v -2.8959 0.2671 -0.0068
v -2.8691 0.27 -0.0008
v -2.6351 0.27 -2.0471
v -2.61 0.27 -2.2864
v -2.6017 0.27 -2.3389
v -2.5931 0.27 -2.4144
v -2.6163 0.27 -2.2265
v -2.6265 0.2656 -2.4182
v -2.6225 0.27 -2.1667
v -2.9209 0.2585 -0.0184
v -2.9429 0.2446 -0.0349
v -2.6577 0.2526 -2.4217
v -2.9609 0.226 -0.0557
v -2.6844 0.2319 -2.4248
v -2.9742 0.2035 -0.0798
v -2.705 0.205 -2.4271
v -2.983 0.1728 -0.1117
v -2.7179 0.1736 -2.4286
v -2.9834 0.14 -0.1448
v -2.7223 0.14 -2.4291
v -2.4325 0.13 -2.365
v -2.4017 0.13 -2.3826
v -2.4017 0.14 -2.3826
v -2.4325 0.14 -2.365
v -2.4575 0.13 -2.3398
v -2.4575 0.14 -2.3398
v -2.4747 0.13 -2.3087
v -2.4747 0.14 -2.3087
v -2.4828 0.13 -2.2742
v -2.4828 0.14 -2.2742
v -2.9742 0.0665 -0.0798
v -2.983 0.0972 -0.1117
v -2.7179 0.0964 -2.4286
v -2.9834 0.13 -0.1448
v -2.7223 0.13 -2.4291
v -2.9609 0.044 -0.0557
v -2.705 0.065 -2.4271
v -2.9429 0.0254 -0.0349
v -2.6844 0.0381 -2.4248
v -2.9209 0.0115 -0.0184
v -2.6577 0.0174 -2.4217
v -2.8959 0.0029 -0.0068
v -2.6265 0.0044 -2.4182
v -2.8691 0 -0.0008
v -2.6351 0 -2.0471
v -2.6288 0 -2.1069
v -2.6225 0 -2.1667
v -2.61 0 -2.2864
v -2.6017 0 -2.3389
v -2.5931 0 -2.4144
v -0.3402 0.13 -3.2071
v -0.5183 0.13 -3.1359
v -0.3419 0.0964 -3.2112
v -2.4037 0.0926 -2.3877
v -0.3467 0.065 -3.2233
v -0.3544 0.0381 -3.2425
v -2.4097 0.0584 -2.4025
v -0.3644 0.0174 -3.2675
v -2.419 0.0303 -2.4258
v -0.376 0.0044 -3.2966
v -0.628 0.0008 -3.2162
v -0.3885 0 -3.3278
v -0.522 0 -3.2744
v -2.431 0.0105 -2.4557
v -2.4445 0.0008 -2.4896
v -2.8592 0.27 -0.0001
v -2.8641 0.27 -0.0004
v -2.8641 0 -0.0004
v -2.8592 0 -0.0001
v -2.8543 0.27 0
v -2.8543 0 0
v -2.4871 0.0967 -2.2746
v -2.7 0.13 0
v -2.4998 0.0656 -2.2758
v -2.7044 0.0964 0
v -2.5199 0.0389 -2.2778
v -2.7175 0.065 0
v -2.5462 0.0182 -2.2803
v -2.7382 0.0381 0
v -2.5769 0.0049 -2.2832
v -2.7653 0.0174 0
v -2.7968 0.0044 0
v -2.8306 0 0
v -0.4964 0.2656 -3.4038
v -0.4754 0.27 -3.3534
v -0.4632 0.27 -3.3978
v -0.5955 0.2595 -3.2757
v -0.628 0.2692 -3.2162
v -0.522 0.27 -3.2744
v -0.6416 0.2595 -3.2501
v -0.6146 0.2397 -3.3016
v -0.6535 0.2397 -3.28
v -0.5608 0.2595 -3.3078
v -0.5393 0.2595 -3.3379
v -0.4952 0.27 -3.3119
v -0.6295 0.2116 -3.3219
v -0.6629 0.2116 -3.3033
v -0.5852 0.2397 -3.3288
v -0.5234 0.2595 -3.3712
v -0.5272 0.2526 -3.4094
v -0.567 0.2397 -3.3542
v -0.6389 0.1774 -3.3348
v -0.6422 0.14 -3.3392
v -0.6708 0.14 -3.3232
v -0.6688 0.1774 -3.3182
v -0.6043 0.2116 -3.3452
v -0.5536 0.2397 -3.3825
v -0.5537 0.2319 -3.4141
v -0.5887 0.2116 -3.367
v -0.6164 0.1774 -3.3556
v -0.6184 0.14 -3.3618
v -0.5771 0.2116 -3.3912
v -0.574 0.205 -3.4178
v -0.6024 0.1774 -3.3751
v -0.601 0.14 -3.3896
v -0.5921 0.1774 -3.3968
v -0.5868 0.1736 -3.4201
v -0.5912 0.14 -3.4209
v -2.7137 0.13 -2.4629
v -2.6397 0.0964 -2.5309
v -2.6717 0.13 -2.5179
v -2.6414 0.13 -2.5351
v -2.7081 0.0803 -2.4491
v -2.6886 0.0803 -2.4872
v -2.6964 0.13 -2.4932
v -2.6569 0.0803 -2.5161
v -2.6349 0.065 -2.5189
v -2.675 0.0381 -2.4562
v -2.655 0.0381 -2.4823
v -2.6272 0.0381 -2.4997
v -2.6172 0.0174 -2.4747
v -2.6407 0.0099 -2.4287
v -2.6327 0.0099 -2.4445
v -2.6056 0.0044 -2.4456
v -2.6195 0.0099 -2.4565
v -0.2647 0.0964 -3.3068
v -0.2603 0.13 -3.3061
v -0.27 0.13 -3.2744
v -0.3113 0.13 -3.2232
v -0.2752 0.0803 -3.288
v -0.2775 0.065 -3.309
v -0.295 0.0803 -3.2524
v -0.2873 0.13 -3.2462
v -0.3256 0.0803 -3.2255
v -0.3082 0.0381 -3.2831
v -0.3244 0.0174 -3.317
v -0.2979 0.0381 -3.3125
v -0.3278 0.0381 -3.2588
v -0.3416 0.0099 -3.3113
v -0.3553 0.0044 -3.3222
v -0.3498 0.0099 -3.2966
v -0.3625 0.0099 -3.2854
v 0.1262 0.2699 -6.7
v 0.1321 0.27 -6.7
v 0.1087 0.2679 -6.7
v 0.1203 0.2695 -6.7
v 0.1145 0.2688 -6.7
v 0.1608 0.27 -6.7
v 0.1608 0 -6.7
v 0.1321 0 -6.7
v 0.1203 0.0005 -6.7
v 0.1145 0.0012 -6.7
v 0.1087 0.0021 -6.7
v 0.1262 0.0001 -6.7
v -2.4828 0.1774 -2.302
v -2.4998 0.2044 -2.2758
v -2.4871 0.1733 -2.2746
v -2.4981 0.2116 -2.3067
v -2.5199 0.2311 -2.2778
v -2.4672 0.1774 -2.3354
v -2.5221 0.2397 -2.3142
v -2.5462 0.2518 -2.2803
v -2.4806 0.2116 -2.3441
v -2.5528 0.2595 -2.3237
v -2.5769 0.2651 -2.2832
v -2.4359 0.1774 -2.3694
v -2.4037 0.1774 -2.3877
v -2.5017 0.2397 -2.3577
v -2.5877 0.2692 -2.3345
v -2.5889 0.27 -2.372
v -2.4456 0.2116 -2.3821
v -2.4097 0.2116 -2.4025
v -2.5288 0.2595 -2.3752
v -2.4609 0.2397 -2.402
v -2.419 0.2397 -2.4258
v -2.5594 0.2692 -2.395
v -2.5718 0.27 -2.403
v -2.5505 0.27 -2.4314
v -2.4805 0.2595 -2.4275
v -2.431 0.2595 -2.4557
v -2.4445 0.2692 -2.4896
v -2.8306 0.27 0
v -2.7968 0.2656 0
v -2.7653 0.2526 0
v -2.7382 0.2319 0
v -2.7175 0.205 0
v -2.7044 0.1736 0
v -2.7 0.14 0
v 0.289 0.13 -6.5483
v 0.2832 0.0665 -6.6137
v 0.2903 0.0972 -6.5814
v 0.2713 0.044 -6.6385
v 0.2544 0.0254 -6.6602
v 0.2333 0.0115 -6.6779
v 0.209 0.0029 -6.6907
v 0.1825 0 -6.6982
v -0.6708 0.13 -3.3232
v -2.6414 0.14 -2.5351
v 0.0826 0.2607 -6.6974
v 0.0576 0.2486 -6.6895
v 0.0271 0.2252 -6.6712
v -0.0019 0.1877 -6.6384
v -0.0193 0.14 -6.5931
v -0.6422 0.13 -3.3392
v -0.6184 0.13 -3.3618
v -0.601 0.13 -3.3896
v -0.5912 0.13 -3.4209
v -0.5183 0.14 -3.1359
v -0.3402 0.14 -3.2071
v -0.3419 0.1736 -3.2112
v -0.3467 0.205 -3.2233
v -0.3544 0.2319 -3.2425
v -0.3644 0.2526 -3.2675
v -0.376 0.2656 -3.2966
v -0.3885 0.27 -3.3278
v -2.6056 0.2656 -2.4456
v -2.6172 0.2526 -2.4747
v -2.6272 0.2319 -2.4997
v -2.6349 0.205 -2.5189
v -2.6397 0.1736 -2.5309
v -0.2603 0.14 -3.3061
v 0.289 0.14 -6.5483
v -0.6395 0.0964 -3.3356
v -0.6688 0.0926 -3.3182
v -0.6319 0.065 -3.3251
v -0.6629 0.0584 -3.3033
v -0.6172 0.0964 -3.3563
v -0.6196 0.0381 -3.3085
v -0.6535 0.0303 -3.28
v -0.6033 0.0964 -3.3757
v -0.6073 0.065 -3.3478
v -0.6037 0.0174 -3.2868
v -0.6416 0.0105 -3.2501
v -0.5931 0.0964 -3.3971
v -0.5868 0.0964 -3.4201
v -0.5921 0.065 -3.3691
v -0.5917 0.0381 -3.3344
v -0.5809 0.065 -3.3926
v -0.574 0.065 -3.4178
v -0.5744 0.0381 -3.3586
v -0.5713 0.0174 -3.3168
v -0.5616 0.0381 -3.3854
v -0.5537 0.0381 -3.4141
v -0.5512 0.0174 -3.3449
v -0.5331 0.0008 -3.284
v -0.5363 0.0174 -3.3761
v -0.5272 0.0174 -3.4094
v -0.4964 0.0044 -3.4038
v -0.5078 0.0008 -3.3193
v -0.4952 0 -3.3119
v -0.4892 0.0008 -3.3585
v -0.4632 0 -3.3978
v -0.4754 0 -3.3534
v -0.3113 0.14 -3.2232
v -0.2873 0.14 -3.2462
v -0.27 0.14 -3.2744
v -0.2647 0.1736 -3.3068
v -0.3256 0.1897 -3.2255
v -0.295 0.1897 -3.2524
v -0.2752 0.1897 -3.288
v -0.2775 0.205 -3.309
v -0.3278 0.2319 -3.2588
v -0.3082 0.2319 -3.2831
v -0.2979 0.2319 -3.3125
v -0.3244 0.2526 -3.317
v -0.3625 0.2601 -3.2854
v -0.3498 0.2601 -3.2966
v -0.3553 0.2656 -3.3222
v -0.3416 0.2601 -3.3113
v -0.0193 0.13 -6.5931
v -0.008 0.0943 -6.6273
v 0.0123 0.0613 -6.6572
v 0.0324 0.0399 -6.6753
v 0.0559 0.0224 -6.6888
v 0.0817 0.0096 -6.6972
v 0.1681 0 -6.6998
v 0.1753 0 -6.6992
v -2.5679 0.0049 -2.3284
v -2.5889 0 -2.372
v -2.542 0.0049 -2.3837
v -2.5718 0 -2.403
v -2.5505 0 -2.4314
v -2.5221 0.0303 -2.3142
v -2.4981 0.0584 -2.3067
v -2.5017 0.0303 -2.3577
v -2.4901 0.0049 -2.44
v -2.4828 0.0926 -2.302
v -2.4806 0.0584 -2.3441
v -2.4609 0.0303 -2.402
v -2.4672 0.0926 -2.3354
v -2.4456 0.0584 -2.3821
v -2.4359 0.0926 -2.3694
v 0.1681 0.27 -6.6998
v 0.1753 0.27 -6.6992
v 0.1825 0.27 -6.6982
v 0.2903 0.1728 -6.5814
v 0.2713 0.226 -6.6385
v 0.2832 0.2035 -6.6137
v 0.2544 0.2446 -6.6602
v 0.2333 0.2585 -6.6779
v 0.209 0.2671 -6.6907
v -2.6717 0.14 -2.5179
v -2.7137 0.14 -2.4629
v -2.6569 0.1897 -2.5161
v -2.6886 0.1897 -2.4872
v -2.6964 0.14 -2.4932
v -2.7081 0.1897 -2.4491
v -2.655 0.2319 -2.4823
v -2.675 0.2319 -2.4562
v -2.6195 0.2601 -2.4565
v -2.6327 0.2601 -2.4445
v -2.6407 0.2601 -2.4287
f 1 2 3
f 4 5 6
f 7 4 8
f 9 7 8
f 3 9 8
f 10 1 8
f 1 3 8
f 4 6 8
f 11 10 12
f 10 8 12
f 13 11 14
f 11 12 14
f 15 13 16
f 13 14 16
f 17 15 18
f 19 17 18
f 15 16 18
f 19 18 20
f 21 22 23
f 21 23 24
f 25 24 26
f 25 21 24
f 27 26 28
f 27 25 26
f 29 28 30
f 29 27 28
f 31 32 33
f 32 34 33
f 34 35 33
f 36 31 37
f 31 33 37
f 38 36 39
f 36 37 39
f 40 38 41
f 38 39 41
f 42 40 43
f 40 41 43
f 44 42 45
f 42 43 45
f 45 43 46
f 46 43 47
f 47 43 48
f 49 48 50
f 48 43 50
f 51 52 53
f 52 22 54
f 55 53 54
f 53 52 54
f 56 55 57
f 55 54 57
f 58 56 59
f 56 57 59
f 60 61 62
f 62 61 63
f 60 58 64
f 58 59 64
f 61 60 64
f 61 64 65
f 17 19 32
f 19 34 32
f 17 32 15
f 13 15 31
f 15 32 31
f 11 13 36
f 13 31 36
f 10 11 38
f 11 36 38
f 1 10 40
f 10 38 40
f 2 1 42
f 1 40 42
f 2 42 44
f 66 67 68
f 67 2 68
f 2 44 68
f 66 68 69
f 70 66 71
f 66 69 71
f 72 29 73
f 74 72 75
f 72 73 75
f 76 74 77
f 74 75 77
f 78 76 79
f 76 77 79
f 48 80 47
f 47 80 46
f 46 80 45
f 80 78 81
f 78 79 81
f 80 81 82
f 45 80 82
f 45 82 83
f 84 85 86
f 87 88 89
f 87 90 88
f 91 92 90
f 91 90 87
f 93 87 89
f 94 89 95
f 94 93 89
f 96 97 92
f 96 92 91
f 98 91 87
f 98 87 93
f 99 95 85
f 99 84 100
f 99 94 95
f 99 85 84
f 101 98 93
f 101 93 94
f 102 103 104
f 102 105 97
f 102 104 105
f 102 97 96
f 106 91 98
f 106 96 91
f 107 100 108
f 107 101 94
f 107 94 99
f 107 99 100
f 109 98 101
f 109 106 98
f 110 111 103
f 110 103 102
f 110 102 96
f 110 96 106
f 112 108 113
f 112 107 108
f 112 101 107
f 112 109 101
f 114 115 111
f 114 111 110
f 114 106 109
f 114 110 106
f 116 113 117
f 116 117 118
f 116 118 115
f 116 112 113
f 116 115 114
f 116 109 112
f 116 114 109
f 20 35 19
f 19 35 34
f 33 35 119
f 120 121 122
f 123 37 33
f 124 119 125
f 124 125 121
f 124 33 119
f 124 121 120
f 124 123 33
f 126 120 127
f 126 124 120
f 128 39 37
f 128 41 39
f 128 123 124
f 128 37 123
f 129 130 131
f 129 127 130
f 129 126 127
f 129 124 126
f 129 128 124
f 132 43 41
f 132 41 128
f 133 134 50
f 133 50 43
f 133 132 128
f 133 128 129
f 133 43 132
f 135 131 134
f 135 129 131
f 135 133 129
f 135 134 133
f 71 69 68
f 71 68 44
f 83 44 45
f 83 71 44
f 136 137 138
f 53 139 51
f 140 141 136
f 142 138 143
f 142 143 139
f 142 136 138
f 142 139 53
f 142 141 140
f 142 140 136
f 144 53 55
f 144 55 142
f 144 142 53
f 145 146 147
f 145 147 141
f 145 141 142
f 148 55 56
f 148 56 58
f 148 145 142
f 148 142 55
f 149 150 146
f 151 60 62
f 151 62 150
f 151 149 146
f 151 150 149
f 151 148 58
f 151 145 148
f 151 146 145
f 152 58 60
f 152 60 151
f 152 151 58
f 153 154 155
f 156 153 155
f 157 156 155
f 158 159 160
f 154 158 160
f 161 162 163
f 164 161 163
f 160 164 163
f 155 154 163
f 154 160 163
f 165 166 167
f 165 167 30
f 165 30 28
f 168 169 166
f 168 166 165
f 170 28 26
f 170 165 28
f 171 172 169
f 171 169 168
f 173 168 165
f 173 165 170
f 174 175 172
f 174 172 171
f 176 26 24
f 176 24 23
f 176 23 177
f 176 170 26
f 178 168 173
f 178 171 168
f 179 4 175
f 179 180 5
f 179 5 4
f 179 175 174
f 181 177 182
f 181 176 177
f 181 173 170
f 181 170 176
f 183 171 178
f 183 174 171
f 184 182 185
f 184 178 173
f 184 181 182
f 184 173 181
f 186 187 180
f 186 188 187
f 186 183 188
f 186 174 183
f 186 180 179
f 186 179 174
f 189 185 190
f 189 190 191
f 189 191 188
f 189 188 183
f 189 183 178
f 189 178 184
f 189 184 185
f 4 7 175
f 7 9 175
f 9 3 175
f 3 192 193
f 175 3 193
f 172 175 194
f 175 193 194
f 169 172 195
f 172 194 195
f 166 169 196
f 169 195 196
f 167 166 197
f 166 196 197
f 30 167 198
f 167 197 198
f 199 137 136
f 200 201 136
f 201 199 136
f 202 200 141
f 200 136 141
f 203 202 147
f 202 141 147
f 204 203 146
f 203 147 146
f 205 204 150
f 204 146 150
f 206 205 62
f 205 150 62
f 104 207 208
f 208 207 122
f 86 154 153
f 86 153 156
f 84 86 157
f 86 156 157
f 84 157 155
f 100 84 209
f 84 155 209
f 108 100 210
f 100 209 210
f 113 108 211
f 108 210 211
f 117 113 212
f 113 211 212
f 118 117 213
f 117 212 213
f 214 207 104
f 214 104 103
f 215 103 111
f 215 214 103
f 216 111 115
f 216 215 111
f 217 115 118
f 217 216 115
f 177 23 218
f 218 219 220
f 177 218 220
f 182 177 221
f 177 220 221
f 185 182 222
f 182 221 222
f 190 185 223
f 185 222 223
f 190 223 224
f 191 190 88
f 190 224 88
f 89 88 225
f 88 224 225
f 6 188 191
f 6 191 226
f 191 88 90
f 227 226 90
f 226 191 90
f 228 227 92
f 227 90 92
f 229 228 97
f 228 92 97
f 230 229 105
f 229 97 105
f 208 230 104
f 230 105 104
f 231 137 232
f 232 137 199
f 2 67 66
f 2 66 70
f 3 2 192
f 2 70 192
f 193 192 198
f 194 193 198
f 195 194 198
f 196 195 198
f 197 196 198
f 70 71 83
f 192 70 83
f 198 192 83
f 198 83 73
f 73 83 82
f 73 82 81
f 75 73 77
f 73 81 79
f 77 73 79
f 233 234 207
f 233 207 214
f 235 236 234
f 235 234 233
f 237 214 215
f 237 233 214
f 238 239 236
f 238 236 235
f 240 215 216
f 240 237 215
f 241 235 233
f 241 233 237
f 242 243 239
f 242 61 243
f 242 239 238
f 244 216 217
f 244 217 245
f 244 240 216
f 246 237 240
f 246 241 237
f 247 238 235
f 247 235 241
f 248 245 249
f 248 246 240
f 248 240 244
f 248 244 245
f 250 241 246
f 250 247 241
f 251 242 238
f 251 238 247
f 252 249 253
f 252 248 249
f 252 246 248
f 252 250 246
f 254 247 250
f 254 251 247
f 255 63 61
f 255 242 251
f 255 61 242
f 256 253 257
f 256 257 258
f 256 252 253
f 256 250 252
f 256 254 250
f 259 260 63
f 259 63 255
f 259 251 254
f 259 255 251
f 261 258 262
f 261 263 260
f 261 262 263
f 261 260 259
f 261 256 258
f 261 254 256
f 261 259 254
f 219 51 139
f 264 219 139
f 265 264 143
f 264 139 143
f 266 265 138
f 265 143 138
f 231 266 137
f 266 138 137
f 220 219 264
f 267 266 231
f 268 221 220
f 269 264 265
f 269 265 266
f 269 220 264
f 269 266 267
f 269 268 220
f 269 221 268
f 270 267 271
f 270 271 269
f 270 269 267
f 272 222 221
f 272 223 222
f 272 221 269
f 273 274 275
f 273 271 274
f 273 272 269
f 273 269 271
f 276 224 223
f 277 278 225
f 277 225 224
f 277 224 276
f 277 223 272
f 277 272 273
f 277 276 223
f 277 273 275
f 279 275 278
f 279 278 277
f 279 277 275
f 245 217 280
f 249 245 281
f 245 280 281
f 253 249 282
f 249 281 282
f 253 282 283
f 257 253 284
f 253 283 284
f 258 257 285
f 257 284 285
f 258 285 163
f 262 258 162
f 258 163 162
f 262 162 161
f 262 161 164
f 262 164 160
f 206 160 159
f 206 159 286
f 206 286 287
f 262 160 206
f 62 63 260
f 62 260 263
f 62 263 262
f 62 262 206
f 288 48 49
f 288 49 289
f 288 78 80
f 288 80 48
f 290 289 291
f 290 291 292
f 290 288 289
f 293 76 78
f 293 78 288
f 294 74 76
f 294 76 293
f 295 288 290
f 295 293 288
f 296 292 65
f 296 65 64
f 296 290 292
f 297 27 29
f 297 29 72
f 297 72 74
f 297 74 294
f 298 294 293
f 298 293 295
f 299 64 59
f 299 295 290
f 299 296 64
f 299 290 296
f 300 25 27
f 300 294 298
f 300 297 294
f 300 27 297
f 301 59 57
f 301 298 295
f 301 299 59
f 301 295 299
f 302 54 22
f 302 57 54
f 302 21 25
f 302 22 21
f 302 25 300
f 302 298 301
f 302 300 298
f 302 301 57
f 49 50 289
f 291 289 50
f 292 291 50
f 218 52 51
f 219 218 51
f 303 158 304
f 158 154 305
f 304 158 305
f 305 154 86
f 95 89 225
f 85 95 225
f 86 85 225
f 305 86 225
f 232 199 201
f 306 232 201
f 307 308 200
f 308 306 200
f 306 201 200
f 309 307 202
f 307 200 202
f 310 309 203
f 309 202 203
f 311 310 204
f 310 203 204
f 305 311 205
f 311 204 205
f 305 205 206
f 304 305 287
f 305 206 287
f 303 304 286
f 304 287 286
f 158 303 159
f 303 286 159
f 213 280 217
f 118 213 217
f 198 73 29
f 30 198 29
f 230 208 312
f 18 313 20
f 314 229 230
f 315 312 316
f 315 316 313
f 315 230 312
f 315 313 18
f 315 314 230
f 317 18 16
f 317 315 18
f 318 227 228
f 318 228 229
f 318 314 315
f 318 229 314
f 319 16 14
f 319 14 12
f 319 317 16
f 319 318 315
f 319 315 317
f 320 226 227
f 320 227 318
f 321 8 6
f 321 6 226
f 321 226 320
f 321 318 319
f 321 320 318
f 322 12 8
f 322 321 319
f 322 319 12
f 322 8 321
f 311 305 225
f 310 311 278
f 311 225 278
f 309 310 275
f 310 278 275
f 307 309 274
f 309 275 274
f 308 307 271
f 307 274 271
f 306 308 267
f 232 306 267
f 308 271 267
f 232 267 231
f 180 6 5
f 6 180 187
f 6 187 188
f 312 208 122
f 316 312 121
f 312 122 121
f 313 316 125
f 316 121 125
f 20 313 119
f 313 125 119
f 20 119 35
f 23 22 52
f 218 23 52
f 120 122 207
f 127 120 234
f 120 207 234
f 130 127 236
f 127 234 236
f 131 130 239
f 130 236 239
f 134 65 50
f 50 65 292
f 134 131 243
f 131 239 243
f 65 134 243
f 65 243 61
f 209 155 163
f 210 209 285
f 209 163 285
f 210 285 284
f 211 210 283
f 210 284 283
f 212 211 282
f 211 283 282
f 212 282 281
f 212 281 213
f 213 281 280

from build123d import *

# Parameters (mm, degrees)
RESSALTO_EXTRUS_O1_DEPTH = 0.27
FILETE2_R                = 0.13


with BuildPart() as part:
    # Esboço1 → Ressalto-extrusão1 (new body)
    with BuildSketch(Plane(origin=(0, 0, 0), x_dir=(1, 0, 0), z_dir=(0, 1, 0))):
        Polygon((-0.272513318, 3.234203787), (0.314684076, 6.7), (0.021085379, 6.7), (0, 6.7), (-0.603963749, 3.35), (-2.713451347, 2.506232841), (-3, 0), (-2.7, 0), (-2.475283392, 2.353124871), (-0.518320279, 3.135884251), align=None)
    extrude(amount=RESSALTO_EXTRUS_O1_DEPTH)

    # Filete2
    # the kernel refuses this fillet: 0.13 mm, written as the material it adds along each edge
    with BuildSketch(Plane(origin=(-2.475283392, 0, -2.353124871), x_dir=(-0.0950646065596586, 0, 0.9954711048441623), z_dir=(0, 1, 0))) as filete2_piece_1:
        with BuildLine():
            CenterArc((FILETE2_R * 0.609734486381, FILETE2_R), FILETE2_R, 207.255794996, 62.744205004)
            Line((-FILETE2_R * 0.279236340383, FILETE2_R * 0.542036170465), (0, 0))
            Line((0, 0), (FILETE2_R * 0.609734486381, 0))
        make_face()
    extrude(amount=0.27)
    with BuildSketch(Plane(origin=(-0.603963749, 0, -3.35), x_dir=(-0.9284809223662713, 0, 0.37138009747680073), z_dir=(0, 1, 0))) as filete2_piece_2:
        with BuildLine():
            CenterArc((FILETE2_R * 0.554072981115, -FILETE2_R), FILETE2_R, 90, 57.979304495)
            Line((-FILETE2_R * 0.293783650389, -FILETE2_R * 0.469774451376), (0, 0))
            Line((0, 0), (FILETE2_R * 0.554072981115, 0))
        make_face()
    extrude(amount=0.27)
    # the kernel refuses this fillet: 0.13 mm, written as the material it takes off along each edge
    with BuildSketch(Plane(origin=(-2.593109265, 0.13, -2.414354436), x_dir=(-0.3713800974768016, 0, -0.9284809223662711), z_dir=(0, -1, 0))) as filete2_2_piece_1_section:
        Polygon((0, 0), (FILETE2_R, 0), (FILETE2_R, -FILETE2_R * 0.597027041994), (FILETE2_R * 0.474446418292, -FILETE2_R * 0.880284383691), align=None)
    filete2_2_piece_1 = extrude(amount=FILETE2_R, mode=Mode.PRIVATE)
    filete2_2_piece_1 = filete2_2_piece_1 - Plane(origin=(-2.593109265, 0.13, -2.414354436), x_dir=(0.7948289276830398, 0, 0.6068335650886731), z_dir=(0, -1, 0)) * Sphere(FILETE2_R, mode=Mode.PRIVATE)
    add(filete2_2_piece_1, mode=Mode.SUBTRACT)
    with BuildSketch(Plane(origin=(-0.388504479, 0.13, -3.327822502), x_dir=(0.9859491340163403, 0, 0.16704581746463637), z_dir=(0, -1, 0))) as filete2_2_piece_2_section:
        Polygon((0, 0), (FILETE2_R, 0), (FILETE2_R, FILETE2_R * 0.560980407137), (FILETE2_R * 0.521260740175, FILETE2_R * 0.853397469385), align=None)
    filete2_2_piece_2 = extrude(amount=FILETE2_R, mode=Mode.PRIVATE)
    filete2_2_piece_2 = filete2_2_piece_2 - Plane(origin=(-0.388504479, 0.13, -3.327822502), x_dir=(-0.7781590553418893, 0, -0.6280672611985266), z_dir=(0, -1, 0)) * Sphere(FILETE2_R, mode=Mode.PRIVATE)
    add(filete2_2_piece_2, mode=Mode.SUBTRACT)
    with BuildSketch(Plane(origin=(-0.388504479, 0.14, -3.327822502), x_dir=(0.9859491340163403, 0, 0.16704581746463637), z_dir=(0, 1, 0))) as filete2_2_piece_3_section:
        Polygon((0, 0), (FILETE2_R, 0), (FILETE2_R, -FILETE2_R * 0.560980407137), (FILETE2_R * 0.521260740175, -FILETE2_R * 0.853397469385), align=None)
    filete2_2_piece_3 = extrude(amount=FILETE2_R, mode=Mode.PRIVATE)
    filete2_2_piece_3 = filete2_2_piece_3 - Plane(origin=(-0.388504479, 0.14, -3.327822502), x_dir=(-0.7781590553418893, 0, -0.6280672611985266), z_dir=(0, 1, 0)) * Sphere(FILETE2_R, mode=Mode.PRIVATE)
    add(filete2_2_piece_3, mode=Mode.SUBTRACT)
    with BuildSketch(Plane(origin=(-2.593109265, 0.14, -2.414354436), x_dir=(-0.3713800974768016, 0, -0.9284809223662711), z_dir=(0, 1, 0))) as filete2_2_piece_4_section:
        Polygon((0, 0), (FILETE2_R, 0), (FILETE2_R, FILETE2_R * 0.597027041994), (FILETE2_R * 0.474446418292, FILETE2_R * 0.880284383691), align=None)
    filete2_2_piece_4 = extrude(amount=FILETE2_R, mode=Mode.PRIVATE)
    filete2_2_piece_4 = filete2_2_piece_4 - Plane(origin=(-2.593109265, 0.14, -2.414354436), x_dir=(0.7948289276830398, 0, 0.6068335650886731), z_dir=(0, 1, 0)) * Sphere(FILETE2_R, mode=Mode.PRIVATE)
    add(filete2_2_piece_4, mode=Mode.SUBTRACT)
    with BuildSketch(Plane(origin=(-2.722267803, 0, -2.429121702), x_dir=(0.9935272135866853, 0, 0.11359434784652435), z_dir=(-0.11359434784652435, 0, 0.9935272135866853))) as filete2_2_piece_5:
        with BuildLine():
            CenterArc((FILETE2_R, FILETE2_R), FILETE2_R, 180, 90)
            Line((0, FILETE2_R), (0, 0))
            Line((0, 0), (FILETE2_R, 0))
        make_face()
    extrude(amount=2.769947324, mode=Mode.SUBTRACT)
    with BuildSketch(Plane(origin=(-0.670841754, 0, -3.323249682), x_dir=(0.3713800974768015, 0, 0.9284809223662709), z_dir=(-0.9284809223662711, 0, 0.3713800974768016))) as filete2_2_piece_6:
        with BuildLine():
            CenterArc((FILETE2_R, FILETE2_R), FILETE2_R, 180, 90)
            Line((0, FILETE2_R), (0, 0))
            Line((0, 0), (FILETE2_R, 0))
        make_face()
    extrude(amount=2.122334317, mode=Mode.SUBTRACT)
    with BuildSketch(Plane(origin=(0.057663849, 0, -7.019843525), x_dir=(0.9841339231865321, 0, 0.17742722799357663), z_dir=(-0.17742722799357666, 0, 0.9841339231865323))) as filete2_2_piece_7:
        with BuildLine():
            CenterArc((FILETE2_R, FILETE2_R), FILETE2_R, 180, 90)
            Line((0, FILETE2_R), (0, 0))
            Line((0, 0), (FILETE2_R, 0))
        make_face()
    extrude(amount=3.656978769, mode=Mode.SUBTRACT)
    with BuildSketch(Plane(origin=(-0.260331092, 0, -3.306106546), x_dir=(0, 1, 0), z_dir=(0.16704581746463637, 0, -0.9859491340163403))) as filete2_2_piece_8:
        with BuildLine():
            CenterArc((FILETE2_R, -FILETE2_R), FILETE2_R, 90, 90)
            Line((0, -FILETE2_R), (0, 0))
            Line((0, 0), (FILETE2_R, 0))
        make_face()
    extrude(amount=3.767260191, mode=Mode.SUBTRACT)
    with BuildSketch(Plane(origin=(0.057663849, 0.27, -7.019843525), x_dir=(0.9841339231865321, 0, 0.17742722799357663), z_dir=(-0.17742722799357666, 0, 0.9841339231865323))) as filete2_2_piece_9:
        with BuildLine():
            CenterArc((FILETE2_R, -FILETE2_R), FILETE2_R, 90, 90)
            Line((0, -FILETE2_R), (0, 0))
            Line((0, 0), (FILETE2_R, 0))
        make_face()
    extrude(amount=3.656978769, mode=Mode.SUBTRACT)
    with BuildSketch(Plane(origin=(-0.272513318, 0.13, -3.234203787), x_dir=(0.16704581746463568, 0, -0.9859491340163404), z_dir=(0, 1, 0))) as filete2_2_piece_10:
        with BuildLine():
            CenterArc((FILETE2_R * 0.560980407137, FILETE2_R), FILETE2_R, 211.416857509, 58.583142491)
            Line((-FILETE2_R * 0.292417062248, FILETE2_R * 0.478739259825), (0, 0))
            Line((0, 0), (FILETE2_R * 0.560980407137, 0))
        make_face()
    extrude(amount=0.01, mode=Mode.SUBTRACT)
    with BuildSketch(Plane(origin=(-3, -0.364276044, 0), x_dir=(0.11359434784652375, 0, -0.9935272135866854), z_dir=(0, 1, 0))) as filete2_2_piece_11:
        with BuildLine():
            CenterArc((FILETE2_R * 1.1208493664, -FILETE2_R), FILETE2_R, 90, 96.522555827)
            Line((FILETE2_R * 0.12732215281, -FILETE2_R * 1.11359434785), (0, 0))
            Line((0, 0), (FILETE2_R * 1.1208493664, 0))
        make_face()
    extrude(amount=0.998552088, mode=Mode.SUBTRACT)
    with BuildSketch(Plane(origin=(-2.713451347, 0.13, -2.506232841), x_dir=(0.9284809223662704, 0, -0.3713800974768032), z_dir=(0, 1, 0))) as filete2_2_piece_12:
        with BuildLine():
            CenterArc((FILETE2_R * 0.597027041994, -FILETE2_R), FILETE2_R, 90, 61.676687502)
            Line((-FILETE2_R * 0.283257341697, -FILETE2_R * 0.525553581708), (0, 0))
            Line((0, 0), (FILETE2_R * 0.597027041994, 0))
        make_face()
    extrude(amount=0.01, mode=Mode.SUBTRACT)
    with BuildSketch(Plane(origin=(0, -0.271646109, -6.7), x_dir=(1, 0, 0), z_dir=(0, 1, 0))) as filete2_2_piece_13:
        with BuildLine():
            CenterArc((FILETE2_R * 0.835834181331, -FILETE2_R), FILETE2_R, 90, 79.780061166)
            Line((-FILETE2_R * 0.148299741856, -FILETE2_R * 0.822572772006), (0, 0))
            Line((0, 0), (FILETE2_R * 0.835834181331, 0))
        make_face()
    extrude(amount=0.813292218, mode=Mode.SUBTRACT)
    with BuildSketch(Plane(origin=(0.314684076, -0.384695191, -6.7), x_dir=(-0.16704581746463687, 0, 0.9859491340163402), z_dir=(0, 1, 0))) as filete2_2_piece_14:
        with BuildLine():
            CenterArc((FILETE2_R * 1.18367751155, -FILETE2_R), FILETE2_R, 90, 99.616100838)
            Line((FILETE2_R * 0.197728377531, -FILETE2_R * 1.16704581746), (0, 0))
            Line((0, 0), (FILETE2_R * 1.18367751155, 0))
        make_face()
    extrude(amount=1.039390383, mode=Mode.SUBTRACT)
    with BuildSketch(Plane(origin=(-0.670841754, 0.27, -3.323249682), x_dir=(0.3713800974768015, 0, 0.9284809223662709), z_dir=(-0.9284809223662711, 0, 0.3713800974768016))) as filete2_2_piece_15:
        with BuildLine():
            CenterArc((FILETE2_R, -FILETE2_R), FILETE2_R, 90, 90)
            Line((0, -FILETE2_R), (0, 0))
            Line((0, 0), (FILETE2_R, 0))
        make_face()
    extrude(amount=2.122334317, mode=Mode.SUBTRACT)
    with BuildSketch(Plane(origin=(-2.722267803, 0.27, -2.429121702), x_dir=(0.9935272135866853, 0, 0.11359434784652435), z_dir=(-0.11359434784652435, 0, 0.9935272135866853))) as filete2_2_piece_16:
        with BuildLine():
            CenterArc((FILETE2_R, -FILETE2_R), FILETE2_R, 90, 90)
            Line((0, -FILETE2_R), (0, 0))
            Line((0, 0), (FILETE2_R, 0))
        make_face()
    extrude(amount=2.769947324, mode=Mode.SUBTRACT)
    with BuildSketch(Plane(origin=(-2.730895997, 0.27, 0.323528109), x_dir=(-0.9954711048441621, 0, -0.09506460655966084), z_dir=(0.09506460655966086, 0, -0.9954711048441622))) as filete2_2_piece_17:
        with BuildLine():
            CenterArc((FILETE2_R, -FILETE2_R), FILETE2_R, 90, 90)
            Line((0, -FILETE2_R), (0, 0))
            Line((0, 0), (FILETE2_R, 0))
        make_face()
    extrude(amount=2.609564928, mode=Mode.SUBTRACT)
    with BuildSketch(Plane(origin=(-0.340225066, 0.27, -3.207119982), x_dir=(0, -1, 0), z_dir=(-0.928480922366271, 0, 0.37138009747680173)), Plane(origin=(-2.401686903, 0, -2.382562494), x_dir=(0, 1, 0), z_dir=(0.928480922366271, 0, -0.37138009747680173))) as filete2_2_piece_18:
        with BuildLine():
            CenterArc((FILETE2_R, -FILETE2_R), FILETE2_R, 90, 90)
            Line((0, -FILETE2_R), (0, 0))
            Line((0, 0), (FILETE2_R, 0))
        make_face()
    extrude(amount=2.220252228, mode=Mode.SUBTRACT)
    with BuildSketch(Plane(origin=(-0.260331092, 0.27, -3.306106546), x_dir=(0, -1, 0), z_dir=(0.16704581746463637, 0, -0.9859491340163403))) as filete2_2_piece_19:
        with BuildLine():
            CenterArc((FILETE2_R, FILETE2_R), FILETE2_R, 180, 90)
            Line((0, FILETE2_R), (0, 0))
            Line((0, 0), (FILETE2_R, 0))
        make_face()
    extrude(amount=3.767260191, mode=Mode.SUBTRACT)
    with BuildSketch(Plane(origin=(-2.730895997, 0, 0.323528109), x_dir=(-0.9954711048441621, 0, -0.09506460655966084), z_dir=(0.09506460655966086, 0, -0.9954711048441622))) as filete2_2_piece_20:
        with BuildLine():
            CenterArc((FILETE2_R, FILETE2_R), FILETE2_R, 180, 90)
            Line((0, FILETE2_R), (0, 0))
            Line((0, 0), (FILETE2_R, 0))
        make_face()
    extrude(amount=2.609564928, mode=Mode.SUBTRACT)
    with BuildSketch(Plane(origin=(-2.35340749, 0, -2.261859974), x_dir=(-0.9954711048441621, 0, -0.09506460655966179), z_dir=(-0.09506460655966179, 0, 0.9954711048441621))) as filete2_2_piece_21:
        with BuildLine():
            CenterArc((0.13 + FILETE2_R, -FILETE2_R), FILETE2_R, 90, 90)
            Line((0.13, -FILETE2_R), (0.13, 0))
            Line((0.13, 0), (0.13 + FILETE2_R, 0))
        make_face()
    revolve(axis=Axis((-2.35340749, 0, -2.261859974), (0, -1, 0)), revolution_arc=62.744205004, mode=Mode.SUBTRACT)
    with BuildSketch(Plane(origin=(-2.35340749, 0.27, -2.261859974), x_dir=(-0.9954711048441621, 0, -0.09506460655966179), z_dir=(-0.09506460655966179, 0, 0.9954711048441621))) as filete2_2_piece_22:
        with BuildLine():
            CenterArc((0.13 + FILETE2_R, FILETE2_R), FILETE2_R, 180, 90)
            Line((0.13, FILETE2_R), (0.13, 0))
            Line((0.13, 0), (0.13 + FILETE2_R, 0))
        make_face()
    revolve(axis=Axis((-2.35340749, 0.27, -2.261859974), (0, -1, 0)), revolution_arc=62.744205004, mode=Mode.SUBTRACT)
    with BuildSketch(Plane(origin=(-0.719121167, 0.27, -3.443952202), x_dir=(0.37138009747680156, 0, 0.9284809223662711), z_dir=(-0.9284809223662711, 0, 0.37138009747680156))) as filete2_2_piece_23:
        with BuildLine():
            CenterArc((0.13 + FILETE2_R, -FILETE2_R), FILETE2_R, 90, 90)
            Line((0.13, -FILETE2_R), (0.13, 0))
            Line((0.13, 0), (0.13 + FILETE2_R, 0))
        make_face()
    revolve(axis=Axis((-0.719121167, 0.27, -3.443952202), (0, 1, 0)), revolution_arc=57.979304495, mode=Mode.SUBTRACT)
    with BuildSketch(Plane(origin=(-0.719121167, 0, -3.443952202), x_dir=(0.37138009747680156, 0, 0.9284809223662711), z_dir=(-0.9284809223662711, 0, 0.37138009747680156))) as filete2_2_piece_24:
        with BuildLine():
            CenterArc((0.13 + FILETE2_R, FILETE2_R), FILETE2_R, 180, 90)
            Line((0.13, FILETE2_R), (0.13, 0))
            Line((0.13, 0), (0.13 + FILETE2_R, 0))
        make_face()
    revolve(axis=Axis((-0.719121167, 0, -3.443952202), (0, 1, 0)), revolution_arc=57.979304495, mode=Mode.SUBTRACT)


solid = part.part
